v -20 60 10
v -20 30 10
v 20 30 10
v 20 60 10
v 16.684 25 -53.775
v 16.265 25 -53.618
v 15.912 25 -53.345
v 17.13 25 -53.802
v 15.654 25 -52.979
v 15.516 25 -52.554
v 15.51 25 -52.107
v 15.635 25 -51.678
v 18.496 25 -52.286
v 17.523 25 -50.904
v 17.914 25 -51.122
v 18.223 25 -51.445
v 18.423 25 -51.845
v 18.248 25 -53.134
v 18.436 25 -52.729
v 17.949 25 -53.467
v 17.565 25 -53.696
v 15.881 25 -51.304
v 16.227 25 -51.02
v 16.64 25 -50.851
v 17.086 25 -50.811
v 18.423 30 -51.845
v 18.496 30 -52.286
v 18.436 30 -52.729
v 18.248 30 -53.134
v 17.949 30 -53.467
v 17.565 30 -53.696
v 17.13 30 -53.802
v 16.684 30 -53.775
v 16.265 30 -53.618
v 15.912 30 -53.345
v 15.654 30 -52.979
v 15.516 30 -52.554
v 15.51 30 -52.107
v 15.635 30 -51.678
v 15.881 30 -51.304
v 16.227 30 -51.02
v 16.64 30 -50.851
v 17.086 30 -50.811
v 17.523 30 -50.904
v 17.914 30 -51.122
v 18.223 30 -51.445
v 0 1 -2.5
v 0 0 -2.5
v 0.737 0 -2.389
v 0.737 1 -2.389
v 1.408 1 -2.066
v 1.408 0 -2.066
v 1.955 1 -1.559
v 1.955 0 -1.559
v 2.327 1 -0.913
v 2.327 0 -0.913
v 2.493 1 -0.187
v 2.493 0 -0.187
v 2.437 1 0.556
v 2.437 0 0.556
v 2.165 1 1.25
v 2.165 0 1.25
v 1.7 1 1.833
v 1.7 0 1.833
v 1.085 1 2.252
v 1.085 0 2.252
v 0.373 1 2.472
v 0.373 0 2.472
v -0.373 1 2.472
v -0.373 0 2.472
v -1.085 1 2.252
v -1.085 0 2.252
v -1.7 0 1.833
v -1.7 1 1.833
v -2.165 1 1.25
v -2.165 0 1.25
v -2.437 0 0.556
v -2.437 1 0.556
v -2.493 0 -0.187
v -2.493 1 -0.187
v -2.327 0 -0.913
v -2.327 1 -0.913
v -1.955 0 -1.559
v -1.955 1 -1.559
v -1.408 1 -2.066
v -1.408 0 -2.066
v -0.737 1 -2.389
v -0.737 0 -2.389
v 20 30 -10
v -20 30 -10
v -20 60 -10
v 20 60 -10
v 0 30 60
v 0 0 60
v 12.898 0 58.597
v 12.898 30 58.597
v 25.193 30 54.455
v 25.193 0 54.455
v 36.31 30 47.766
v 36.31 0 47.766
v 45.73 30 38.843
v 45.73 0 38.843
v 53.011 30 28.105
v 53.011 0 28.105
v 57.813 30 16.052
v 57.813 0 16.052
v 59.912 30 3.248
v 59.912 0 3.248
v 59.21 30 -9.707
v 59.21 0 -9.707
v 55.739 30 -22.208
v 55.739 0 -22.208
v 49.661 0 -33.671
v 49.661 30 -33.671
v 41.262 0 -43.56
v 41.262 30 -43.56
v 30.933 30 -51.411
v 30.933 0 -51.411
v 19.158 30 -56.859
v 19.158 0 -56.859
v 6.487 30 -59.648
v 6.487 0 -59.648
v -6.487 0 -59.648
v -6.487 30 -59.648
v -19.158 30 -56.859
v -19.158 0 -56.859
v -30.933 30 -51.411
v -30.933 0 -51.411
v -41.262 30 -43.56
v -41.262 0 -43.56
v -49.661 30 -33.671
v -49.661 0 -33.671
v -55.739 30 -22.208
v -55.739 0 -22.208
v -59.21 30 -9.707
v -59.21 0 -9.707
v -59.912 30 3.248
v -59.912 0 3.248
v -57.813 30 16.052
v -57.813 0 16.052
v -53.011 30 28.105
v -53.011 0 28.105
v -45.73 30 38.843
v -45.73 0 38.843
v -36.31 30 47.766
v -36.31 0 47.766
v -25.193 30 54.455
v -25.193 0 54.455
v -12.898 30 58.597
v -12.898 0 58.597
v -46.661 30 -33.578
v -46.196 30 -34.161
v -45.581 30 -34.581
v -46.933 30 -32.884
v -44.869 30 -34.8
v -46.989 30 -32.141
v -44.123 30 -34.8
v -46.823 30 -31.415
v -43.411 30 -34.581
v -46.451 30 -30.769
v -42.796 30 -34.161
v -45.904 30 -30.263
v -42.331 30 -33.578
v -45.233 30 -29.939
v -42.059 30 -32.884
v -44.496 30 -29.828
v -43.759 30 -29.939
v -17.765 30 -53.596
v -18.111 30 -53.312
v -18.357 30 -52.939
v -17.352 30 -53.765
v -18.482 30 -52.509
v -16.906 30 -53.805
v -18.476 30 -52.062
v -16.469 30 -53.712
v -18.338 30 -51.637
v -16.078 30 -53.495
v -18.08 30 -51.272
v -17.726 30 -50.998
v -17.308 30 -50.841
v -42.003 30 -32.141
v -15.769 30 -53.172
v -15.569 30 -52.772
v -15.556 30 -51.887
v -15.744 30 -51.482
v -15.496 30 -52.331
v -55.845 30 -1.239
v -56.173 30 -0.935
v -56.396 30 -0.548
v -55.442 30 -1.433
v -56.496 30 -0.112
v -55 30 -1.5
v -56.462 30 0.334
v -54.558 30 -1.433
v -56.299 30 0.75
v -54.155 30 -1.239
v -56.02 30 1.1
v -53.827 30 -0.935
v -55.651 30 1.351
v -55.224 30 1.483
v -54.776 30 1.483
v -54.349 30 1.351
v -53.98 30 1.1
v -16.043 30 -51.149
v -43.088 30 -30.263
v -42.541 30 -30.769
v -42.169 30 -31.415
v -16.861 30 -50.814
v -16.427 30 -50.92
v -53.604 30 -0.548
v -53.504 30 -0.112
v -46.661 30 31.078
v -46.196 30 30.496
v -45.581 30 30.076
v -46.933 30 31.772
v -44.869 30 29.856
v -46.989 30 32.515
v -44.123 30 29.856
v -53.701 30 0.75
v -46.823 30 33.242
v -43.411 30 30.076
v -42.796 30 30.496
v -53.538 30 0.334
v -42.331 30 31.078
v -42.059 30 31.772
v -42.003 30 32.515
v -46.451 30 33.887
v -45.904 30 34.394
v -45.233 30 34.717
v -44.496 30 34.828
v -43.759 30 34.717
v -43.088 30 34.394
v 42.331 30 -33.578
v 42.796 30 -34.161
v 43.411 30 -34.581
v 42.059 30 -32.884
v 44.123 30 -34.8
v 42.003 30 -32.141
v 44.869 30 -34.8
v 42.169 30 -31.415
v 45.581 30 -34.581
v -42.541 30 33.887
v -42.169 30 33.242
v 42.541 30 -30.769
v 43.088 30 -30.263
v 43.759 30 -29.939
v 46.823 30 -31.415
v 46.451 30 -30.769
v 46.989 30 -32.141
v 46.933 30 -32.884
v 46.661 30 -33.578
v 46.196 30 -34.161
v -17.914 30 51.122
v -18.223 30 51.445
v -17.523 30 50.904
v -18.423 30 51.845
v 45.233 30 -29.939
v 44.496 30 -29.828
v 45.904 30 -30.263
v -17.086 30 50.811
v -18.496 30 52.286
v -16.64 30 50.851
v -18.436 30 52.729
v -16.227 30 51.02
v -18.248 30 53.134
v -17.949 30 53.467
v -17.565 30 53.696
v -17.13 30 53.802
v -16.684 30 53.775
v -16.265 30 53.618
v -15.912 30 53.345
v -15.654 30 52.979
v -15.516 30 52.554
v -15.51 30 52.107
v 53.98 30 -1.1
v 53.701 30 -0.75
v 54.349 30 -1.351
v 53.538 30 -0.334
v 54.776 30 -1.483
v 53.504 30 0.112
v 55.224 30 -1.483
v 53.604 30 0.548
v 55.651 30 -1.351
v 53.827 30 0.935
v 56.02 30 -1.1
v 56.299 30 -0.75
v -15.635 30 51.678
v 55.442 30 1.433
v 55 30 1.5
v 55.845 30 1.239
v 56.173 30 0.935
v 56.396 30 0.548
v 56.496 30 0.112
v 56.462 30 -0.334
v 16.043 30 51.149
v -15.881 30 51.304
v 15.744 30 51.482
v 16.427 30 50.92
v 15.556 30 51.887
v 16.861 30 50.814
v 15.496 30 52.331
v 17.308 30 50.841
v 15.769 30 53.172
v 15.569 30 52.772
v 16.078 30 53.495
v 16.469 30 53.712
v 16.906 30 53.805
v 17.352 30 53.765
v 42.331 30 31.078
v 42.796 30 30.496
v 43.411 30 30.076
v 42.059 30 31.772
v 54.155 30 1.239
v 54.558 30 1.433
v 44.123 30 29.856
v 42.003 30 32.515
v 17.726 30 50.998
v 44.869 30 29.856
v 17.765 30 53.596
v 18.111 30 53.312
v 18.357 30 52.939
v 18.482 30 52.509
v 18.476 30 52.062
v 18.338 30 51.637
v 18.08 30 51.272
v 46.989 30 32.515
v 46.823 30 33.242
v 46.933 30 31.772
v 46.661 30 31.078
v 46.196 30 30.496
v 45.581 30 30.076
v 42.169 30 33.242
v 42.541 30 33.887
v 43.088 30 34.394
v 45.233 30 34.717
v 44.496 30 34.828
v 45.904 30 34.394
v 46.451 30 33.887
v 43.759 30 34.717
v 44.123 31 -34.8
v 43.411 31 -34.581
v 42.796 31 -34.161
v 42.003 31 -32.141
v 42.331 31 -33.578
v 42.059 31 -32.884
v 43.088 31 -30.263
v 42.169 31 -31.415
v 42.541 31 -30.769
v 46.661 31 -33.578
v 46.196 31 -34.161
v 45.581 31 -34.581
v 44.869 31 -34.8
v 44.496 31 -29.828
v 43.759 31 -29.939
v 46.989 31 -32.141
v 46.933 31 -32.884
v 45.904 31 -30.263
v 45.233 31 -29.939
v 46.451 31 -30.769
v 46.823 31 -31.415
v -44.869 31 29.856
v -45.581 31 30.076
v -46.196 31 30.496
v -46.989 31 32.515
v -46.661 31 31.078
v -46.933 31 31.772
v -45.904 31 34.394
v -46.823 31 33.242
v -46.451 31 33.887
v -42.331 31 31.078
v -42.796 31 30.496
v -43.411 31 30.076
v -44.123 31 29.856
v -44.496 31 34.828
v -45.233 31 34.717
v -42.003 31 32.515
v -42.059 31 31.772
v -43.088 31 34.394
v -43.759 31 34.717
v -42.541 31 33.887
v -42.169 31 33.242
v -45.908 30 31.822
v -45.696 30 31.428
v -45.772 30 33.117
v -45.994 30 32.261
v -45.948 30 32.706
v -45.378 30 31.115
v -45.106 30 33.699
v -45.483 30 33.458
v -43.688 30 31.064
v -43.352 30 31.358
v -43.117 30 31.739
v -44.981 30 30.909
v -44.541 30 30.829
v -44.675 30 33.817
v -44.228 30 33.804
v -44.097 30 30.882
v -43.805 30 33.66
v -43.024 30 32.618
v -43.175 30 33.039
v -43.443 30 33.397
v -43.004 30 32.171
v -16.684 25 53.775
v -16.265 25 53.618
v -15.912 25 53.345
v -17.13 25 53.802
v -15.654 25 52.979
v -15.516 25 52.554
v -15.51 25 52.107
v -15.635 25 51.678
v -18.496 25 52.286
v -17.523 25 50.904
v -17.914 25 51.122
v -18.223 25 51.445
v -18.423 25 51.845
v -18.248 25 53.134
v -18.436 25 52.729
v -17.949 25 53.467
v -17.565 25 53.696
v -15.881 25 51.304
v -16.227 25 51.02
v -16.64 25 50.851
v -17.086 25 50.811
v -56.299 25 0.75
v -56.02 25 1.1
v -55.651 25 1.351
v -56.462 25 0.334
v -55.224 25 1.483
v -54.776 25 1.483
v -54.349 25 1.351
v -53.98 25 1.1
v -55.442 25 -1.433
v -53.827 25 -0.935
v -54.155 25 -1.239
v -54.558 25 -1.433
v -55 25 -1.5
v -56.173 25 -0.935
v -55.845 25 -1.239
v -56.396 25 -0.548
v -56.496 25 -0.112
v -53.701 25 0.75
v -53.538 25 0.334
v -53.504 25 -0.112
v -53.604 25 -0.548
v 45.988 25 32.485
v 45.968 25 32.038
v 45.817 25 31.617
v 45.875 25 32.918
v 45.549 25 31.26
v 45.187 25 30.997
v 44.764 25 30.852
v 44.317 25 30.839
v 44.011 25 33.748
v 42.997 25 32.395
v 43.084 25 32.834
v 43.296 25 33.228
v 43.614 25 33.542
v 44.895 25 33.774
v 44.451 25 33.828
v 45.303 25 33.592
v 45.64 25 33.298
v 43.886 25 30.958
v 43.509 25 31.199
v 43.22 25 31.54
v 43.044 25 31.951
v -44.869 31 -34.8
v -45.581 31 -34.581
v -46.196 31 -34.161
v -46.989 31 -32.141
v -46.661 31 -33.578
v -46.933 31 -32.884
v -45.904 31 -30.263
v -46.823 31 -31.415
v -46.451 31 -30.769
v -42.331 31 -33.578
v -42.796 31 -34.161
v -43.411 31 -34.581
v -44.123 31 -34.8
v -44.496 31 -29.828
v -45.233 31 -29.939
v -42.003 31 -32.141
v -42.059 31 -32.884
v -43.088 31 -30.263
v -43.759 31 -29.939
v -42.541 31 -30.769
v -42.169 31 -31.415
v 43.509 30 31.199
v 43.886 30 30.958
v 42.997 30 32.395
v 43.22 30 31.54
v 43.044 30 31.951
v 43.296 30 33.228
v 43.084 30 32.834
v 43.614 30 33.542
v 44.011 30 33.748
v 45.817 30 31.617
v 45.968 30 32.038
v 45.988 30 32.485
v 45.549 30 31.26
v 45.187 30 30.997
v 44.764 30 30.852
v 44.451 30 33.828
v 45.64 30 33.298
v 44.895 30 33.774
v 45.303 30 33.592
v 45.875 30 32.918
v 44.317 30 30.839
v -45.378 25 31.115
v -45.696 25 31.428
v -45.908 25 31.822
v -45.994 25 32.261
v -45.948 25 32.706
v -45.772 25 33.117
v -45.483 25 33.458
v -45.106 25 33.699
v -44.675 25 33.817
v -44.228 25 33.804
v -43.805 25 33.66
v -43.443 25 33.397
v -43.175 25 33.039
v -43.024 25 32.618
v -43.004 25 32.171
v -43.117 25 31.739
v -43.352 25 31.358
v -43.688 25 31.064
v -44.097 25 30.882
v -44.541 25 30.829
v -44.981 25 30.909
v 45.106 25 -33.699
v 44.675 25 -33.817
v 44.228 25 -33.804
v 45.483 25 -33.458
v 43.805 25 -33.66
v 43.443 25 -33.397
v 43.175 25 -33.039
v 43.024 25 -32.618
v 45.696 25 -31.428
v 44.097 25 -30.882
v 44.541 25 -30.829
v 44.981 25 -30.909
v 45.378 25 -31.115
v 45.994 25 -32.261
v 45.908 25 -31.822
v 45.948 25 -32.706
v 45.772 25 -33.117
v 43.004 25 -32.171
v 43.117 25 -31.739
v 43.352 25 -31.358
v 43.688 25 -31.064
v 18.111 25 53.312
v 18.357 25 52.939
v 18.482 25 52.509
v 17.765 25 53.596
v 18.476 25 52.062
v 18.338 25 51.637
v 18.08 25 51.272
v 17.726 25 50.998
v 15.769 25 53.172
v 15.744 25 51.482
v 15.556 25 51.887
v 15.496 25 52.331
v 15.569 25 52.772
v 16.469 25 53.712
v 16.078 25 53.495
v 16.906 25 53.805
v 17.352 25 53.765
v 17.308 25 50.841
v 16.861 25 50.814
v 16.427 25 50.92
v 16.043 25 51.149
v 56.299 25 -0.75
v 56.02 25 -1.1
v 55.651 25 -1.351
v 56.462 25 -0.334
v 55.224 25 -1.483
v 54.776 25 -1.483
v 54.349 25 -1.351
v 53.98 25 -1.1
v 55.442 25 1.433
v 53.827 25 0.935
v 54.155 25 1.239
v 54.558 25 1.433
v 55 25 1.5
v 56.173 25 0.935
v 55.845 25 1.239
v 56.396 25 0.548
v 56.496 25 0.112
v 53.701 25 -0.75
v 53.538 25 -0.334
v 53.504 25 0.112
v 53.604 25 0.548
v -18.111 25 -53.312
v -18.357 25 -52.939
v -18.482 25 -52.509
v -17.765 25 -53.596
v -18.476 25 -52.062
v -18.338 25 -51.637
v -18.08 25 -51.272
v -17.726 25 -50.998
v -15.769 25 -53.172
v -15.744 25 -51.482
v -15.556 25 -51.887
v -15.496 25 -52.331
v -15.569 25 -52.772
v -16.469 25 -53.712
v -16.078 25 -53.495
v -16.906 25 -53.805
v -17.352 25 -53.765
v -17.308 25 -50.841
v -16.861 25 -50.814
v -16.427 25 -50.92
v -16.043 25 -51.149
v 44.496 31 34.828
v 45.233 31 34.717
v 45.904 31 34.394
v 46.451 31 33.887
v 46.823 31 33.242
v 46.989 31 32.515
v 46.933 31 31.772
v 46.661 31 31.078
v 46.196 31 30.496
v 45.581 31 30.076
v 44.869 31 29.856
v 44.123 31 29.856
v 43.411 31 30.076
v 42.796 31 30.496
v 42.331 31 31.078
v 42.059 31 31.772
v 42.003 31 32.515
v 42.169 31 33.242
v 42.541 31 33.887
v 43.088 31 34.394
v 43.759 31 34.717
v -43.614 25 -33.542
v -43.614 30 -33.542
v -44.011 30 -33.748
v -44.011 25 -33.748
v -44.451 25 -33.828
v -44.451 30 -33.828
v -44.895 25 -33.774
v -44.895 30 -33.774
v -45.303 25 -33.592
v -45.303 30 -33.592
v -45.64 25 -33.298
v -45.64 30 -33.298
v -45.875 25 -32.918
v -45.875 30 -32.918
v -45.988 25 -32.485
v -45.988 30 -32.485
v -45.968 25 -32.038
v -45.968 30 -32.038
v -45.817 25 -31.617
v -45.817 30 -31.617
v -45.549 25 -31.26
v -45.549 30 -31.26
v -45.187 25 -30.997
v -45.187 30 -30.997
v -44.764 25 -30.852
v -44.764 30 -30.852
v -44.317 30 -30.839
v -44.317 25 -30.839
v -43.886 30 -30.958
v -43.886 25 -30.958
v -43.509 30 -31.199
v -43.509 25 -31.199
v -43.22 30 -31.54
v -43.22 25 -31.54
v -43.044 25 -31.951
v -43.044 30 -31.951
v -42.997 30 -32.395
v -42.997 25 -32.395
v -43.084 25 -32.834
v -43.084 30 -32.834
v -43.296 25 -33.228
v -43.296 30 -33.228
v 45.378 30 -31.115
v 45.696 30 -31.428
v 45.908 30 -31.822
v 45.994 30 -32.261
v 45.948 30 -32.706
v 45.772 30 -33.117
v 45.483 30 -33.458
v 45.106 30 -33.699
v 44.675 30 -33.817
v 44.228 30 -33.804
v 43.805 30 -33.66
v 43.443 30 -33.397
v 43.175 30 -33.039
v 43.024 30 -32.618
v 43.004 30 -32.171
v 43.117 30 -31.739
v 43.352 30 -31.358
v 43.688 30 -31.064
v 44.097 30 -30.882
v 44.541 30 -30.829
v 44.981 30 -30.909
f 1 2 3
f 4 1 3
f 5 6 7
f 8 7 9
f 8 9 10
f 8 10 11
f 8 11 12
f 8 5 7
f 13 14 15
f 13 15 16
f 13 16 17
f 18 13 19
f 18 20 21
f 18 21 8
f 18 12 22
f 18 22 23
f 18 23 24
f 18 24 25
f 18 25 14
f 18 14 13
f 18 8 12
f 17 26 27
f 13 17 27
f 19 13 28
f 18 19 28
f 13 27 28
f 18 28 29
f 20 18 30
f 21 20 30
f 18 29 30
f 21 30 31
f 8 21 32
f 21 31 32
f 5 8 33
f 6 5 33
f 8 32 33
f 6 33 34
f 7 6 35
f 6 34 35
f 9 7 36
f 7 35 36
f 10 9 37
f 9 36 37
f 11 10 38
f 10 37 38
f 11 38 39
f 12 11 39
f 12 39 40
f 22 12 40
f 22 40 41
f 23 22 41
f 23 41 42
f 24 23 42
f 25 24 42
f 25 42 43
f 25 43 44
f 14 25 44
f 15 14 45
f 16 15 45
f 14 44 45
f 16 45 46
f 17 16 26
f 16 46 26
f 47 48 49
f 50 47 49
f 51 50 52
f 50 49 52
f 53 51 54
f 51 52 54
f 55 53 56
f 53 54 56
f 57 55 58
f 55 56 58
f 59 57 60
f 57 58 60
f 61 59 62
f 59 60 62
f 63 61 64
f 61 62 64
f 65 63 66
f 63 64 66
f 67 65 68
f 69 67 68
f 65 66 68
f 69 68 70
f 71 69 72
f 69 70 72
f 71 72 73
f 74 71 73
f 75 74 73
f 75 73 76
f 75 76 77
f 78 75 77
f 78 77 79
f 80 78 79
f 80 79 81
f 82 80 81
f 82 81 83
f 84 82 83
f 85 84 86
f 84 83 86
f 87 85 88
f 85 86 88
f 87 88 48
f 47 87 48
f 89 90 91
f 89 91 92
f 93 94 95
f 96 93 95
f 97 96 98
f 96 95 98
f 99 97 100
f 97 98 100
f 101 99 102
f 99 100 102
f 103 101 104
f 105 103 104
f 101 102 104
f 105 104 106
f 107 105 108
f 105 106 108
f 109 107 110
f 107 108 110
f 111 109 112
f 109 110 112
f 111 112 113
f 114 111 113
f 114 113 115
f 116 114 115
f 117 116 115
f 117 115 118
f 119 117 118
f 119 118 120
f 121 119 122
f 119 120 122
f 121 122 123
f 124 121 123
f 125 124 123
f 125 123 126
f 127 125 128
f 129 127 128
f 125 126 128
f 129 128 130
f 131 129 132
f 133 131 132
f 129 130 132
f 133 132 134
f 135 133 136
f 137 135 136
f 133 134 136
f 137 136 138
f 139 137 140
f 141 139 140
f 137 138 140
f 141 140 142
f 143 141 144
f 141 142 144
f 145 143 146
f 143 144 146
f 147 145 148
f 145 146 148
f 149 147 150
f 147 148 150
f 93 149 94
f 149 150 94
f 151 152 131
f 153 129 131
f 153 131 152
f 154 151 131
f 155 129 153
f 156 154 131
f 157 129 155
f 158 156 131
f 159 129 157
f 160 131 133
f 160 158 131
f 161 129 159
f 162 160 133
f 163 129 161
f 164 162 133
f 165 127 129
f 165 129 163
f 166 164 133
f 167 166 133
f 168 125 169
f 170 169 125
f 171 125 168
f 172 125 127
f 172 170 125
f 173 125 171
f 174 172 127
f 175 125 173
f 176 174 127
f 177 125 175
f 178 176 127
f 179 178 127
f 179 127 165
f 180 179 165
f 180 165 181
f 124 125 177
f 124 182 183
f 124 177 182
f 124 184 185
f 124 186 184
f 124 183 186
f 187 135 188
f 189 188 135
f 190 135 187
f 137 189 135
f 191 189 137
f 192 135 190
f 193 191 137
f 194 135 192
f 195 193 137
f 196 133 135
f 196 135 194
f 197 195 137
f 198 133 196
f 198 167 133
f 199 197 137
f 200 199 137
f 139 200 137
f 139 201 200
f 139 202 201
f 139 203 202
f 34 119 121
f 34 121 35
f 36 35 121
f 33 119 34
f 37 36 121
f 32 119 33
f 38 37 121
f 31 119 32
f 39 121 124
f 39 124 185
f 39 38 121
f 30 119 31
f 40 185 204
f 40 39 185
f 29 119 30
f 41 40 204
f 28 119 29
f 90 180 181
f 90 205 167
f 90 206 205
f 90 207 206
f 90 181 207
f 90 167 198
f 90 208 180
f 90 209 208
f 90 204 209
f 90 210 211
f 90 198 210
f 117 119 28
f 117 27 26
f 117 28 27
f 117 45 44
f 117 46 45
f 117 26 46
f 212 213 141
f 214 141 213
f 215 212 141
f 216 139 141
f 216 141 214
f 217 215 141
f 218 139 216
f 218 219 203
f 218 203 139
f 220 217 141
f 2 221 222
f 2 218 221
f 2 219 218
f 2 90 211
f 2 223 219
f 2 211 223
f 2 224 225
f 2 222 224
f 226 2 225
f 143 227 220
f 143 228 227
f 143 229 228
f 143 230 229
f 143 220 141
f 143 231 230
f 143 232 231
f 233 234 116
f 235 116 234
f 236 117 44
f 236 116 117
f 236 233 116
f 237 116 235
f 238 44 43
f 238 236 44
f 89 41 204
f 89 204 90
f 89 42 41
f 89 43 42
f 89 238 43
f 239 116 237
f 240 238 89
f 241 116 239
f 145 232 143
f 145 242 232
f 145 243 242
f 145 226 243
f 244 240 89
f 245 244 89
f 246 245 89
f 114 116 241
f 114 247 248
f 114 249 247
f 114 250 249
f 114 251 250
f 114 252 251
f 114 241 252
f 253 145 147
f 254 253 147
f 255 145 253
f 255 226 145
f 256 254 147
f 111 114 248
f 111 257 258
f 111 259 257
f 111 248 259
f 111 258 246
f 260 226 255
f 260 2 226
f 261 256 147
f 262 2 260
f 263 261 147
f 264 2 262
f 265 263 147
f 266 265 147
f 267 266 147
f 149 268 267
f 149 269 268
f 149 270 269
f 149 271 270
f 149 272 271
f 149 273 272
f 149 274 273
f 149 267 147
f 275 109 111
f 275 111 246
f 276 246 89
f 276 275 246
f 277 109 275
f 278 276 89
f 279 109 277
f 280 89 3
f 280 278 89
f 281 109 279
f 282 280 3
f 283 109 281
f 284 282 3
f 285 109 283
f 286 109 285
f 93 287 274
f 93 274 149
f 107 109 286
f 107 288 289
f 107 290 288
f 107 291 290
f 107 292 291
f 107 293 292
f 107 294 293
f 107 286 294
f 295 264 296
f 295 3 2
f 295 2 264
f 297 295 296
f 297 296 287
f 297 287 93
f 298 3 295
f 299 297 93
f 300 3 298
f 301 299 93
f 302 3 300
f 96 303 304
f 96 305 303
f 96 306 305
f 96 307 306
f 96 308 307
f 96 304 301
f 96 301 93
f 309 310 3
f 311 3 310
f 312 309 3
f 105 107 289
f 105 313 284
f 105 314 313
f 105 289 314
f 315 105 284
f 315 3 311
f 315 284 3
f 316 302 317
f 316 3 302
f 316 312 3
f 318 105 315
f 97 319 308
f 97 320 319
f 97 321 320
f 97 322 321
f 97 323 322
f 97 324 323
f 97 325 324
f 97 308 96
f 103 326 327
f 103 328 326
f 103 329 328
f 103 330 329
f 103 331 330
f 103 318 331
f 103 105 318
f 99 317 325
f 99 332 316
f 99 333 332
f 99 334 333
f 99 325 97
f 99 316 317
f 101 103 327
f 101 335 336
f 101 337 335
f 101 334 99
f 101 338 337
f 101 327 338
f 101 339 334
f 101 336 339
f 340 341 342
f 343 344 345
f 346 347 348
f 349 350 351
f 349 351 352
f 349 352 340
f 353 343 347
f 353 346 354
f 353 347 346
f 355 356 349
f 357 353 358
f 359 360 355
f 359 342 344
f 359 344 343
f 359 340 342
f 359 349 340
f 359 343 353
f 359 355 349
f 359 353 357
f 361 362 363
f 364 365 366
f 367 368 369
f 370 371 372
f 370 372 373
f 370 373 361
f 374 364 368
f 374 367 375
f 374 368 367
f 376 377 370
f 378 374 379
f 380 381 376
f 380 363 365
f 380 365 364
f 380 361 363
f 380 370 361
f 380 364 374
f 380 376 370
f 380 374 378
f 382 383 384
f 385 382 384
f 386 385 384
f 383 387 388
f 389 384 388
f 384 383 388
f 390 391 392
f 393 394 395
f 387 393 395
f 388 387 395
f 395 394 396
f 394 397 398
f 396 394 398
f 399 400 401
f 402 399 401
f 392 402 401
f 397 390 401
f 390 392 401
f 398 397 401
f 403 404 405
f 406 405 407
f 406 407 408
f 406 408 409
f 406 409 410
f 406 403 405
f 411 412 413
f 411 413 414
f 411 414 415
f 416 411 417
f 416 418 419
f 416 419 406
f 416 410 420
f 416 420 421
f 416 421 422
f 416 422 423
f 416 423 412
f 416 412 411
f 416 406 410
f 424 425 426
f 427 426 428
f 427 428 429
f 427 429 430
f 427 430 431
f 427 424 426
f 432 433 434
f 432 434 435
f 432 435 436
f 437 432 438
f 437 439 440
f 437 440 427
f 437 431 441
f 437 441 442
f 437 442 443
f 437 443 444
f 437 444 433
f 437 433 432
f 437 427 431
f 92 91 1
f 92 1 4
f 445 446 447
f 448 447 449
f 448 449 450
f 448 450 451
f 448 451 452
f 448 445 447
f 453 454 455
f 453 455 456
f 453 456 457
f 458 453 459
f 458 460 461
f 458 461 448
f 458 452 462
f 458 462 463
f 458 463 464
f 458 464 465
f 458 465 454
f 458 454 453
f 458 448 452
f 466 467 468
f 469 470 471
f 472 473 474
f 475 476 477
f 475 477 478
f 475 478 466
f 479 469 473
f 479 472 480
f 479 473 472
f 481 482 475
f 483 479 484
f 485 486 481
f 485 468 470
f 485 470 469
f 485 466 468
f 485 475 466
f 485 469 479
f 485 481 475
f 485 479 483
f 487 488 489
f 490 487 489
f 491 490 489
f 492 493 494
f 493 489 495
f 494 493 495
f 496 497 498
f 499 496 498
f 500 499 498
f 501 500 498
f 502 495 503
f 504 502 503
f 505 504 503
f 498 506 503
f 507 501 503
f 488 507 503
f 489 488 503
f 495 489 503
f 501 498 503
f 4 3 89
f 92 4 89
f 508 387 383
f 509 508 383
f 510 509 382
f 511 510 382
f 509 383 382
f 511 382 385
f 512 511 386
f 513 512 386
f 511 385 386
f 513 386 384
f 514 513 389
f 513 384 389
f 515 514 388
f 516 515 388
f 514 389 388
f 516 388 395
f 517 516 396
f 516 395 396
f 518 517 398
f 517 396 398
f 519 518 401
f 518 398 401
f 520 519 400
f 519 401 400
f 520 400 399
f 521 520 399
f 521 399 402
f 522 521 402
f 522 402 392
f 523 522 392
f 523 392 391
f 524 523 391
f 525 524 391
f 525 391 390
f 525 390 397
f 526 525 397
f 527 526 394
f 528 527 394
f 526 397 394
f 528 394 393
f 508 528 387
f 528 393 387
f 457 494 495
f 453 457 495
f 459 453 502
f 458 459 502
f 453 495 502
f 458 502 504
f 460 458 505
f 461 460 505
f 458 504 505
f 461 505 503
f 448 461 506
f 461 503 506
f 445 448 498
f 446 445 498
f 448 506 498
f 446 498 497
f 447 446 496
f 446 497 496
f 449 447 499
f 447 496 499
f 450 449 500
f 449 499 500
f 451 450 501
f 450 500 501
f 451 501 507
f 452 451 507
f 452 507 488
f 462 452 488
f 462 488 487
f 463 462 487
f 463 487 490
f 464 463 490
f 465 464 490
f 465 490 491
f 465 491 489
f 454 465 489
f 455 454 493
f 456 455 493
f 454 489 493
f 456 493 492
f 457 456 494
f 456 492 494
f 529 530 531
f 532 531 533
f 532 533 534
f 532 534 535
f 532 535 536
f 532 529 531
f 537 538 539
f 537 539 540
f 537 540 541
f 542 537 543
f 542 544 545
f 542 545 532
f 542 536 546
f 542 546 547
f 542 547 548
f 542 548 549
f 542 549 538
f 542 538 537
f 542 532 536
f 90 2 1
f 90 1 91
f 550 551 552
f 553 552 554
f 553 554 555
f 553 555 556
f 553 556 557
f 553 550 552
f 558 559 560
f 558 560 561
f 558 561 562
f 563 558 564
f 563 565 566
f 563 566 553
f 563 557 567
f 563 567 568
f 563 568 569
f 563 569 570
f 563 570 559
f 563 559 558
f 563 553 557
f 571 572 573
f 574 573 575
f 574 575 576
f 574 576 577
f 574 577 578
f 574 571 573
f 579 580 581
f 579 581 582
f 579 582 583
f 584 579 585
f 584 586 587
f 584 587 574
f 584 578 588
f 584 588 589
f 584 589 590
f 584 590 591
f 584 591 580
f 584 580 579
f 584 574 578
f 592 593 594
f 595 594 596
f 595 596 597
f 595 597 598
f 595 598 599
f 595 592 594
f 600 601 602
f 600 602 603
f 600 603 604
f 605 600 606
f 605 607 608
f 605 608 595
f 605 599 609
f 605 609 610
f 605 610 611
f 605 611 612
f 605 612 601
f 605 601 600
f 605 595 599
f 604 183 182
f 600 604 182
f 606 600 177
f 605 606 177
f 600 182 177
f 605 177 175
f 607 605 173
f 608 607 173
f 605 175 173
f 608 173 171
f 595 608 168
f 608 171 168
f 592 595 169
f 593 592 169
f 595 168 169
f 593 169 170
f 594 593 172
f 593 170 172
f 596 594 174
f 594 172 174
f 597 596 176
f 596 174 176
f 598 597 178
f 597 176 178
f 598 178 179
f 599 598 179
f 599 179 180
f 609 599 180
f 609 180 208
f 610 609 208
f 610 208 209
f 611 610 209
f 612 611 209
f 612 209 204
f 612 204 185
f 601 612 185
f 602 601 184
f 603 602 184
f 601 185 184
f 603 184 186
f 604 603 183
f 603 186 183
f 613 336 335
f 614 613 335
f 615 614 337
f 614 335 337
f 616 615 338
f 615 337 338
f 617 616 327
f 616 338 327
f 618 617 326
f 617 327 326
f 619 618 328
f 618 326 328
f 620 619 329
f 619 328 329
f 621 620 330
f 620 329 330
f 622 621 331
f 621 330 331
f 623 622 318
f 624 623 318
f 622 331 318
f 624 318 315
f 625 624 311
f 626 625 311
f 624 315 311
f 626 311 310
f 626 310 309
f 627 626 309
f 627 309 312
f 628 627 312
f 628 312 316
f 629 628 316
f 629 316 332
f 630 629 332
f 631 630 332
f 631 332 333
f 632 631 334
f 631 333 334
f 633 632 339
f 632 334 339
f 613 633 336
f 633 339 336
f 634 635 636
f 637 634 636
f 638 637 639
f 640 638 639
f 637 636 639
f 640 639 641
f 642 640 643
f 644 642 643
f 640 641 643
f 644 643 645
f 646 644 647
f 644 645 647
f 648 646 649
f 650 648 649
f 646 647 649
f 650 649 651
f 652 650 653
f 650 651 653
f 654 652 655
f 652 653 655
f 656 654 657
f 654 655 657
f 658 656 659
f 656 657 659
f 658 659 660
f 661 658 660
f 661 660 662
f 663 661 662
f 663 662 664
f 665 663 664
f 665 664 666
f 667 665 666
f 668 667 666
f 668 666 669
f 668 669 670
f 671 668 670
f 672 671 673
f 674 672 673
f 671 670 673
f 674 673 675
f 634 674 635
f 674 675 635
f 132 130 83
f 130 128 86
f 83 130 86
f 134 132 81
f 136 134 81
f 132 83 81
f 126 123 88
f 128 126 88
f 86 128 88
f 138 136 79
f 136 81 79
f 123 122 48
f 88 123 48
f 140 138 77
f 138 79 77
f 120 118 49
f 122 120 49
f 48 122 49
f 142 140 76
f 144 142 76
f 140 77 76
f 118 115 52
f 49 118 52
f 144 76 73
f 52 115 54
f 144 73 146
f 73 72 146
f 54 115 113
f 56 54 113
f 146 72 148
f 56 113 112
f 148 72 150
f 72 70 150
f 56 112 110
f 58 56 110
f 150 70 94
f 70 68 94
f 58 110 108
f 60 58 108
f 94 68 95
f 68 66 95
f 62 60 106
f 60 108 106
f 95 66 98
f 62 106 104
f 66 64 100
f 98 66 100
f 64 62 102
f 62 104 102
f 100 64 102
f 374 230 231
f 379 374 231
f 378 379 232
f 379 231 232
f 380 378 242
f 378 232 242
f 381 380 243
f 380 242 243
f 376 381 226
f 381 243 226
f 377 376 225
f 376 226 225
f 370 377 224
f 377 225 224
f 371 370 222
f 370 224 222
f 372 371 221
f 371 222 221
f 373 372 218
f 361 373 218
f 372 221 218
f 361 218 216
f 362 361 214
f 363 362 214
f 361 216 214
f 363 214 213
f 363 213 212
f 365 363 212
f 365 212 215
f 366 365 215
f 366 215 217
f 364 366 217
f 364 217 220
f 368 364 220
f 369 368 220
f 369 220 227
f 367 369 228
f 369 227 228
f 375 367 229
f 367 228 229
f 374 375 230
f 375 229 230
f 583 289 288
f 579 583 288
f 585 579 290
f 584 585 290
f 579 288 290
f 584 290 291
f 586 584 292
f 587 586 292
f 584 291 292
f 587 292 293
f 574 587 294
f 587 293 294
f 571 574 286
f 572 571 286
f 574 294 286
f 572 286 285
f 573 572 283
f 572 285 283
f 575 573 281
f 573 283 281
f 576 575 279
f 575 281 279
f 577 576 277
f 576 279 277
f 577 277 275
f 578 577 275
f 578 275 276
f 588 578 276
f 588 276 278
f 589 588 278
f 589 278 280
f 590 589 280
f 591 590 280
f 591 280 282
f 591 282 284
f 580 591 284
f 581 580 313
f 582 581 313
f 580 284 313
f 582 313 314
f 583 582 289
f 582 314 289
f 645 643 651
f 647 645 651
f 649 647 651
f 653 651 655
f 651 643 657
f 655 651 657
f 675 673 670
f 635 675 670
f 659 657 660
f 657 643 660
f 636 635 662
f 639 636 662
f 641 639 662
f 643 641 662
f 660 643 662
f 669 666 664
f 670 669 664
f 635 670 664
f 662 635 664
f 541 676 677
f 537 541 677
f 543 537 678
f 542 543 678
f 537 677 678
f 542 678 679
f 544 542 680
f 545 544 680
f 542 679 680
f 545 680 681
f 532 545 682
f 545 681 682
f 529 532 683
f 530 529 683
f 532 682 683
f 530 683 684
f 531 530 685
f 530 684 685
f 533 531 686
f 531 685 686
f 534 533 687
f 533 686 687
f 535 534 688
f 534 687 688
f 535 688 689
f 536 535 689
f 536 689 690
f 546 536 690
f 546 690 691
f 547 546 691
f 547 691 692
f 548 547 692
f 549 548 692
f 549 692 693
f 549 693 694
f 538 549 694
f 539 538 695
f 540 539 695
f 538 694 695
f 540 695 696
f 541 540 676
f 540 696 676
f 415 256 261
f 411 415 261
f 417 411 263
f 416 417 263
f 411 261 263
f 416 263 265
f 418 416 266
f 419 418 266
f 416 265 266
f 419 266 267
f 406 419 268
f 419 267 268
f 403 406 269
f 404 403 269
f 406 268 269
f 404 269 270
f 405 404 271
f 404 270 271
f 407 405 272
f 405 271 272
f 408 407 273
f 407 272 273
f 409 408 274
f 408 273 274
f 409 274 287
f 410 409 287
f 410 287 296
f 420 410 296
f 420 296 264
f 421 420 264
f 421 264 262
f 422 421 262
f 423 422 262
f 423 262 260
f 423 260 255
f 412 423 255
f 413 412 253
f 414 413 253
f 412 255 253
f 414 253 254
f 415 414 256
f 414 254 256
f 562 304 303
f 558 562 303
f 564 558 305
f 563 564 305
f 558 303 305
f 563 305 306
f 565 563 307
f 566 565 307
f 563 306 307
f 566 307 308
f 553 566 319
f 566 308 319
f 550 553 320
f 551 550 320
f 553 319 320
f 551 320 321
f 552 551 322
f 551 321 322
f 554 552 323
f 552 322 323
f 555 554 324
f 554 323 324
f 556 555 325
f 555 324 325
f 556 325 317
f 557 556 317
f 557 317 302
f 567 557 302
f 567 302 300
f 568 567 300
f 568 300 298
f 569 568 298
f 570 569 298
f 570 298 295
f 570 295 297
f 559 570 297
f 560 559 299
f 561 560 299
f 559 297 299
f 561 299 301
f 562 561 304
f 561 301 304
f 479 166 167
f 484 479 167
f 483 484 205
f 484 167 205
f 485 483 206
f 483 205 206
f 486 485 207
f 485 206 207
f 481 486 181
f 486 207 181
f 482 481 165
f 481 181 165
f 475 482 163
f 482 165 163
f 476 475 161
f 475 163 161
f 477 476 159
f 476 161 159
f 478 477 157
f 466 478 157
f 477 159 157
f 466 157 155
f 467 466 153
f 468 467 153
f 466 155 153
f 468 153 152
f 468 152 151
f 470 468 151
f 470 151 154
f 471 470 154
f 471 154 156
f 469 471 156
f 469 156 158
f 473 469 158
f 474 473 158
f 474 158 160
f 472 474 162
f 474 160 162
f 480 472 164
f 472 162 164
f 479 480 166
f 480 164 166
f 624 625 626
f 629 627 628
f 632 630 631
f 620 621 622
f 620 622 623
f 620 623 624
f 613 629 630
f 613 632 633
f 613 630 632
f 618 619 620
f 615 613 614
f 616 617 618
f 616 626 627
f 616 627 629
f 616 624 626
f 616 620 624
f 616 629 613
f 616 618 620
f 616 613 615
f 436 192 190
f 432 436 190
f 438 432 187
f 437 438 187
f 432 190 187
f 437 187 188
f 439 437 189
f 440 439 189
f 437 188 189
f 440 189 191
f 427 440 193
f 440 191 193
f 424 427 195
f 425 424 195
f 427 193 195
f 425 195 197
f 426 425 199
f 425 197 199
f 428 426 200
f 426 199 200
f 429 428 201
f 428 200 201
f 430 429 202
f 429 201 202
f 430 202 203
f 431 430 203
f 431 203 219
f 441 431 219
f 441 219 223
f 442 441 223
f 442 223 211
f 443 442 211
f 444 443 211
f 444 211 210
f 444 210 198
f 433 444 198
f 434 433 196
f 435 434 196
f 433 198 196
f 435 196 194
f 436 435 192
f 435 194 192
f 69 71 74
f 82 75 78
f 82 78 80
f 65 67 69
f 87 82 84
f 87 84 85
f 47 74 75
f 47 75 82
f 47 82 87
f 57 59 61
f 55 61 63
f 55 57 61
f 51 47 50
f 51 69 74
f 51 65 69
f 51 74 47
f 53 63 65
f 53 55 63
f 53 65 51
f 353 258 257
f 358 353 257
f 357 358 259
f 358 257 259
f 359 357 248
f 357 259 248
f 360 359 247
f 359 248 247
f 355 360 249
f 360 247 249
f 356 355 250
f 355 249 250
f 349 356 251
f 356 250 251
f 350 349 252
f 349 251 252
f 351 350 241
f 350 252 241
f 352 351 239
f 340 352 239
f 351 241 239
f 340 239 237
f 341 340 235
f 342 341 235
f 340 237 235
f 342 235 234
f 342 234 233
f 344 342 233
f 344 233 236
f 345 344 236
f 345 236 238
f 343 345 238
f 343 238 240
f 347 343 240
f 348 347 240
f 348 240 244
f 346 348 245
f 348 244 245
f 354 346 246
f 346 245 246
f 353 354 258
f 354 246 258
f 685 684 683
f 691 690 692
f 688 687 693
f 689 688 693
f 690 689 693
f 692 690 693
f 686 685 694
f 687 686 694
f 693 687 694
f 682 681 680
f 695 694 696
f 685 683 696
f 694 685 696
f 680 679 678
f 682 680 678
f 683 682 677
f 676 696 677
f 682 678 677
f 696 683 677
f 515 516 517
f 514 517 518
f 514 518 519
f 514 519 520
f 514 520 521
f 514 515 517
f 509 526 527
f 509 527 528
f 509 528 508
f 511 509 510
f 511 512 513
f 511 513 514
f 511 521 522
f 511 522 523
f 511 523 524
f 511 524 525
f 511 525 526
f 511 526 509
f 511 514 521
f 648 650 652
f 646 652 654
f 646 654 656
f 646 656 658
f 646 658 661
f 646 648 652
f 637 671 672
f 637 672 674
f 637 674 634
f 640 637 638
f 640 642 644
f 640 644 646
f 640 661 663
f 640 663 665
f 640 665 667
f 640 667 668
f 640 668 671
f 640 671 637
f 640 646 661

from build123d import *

# Parameters (mm, degrees)
SKETCH_1_R               = 60
EXTRUDE_1_DEPTH          = 30
SKETCH_2_R               = 1.5
CUT_EXTRUDE_1_DEPTH      = 5
PATTERN_CIRCULAR_1_COUNT = 10
SKETCH_3_W               = 40
SKETCH_3_H               = 20
EXTRUDE_2_DEPTH          = 30
SKETCH_5_R               = 2.5
EXTRUDE_4_DEPTH          = 1
SKETCH_7_R               = 2.5
CUT_EXTRUDE_2_DEPTH      = 1


with BuildPart() as part:
    # 草图1 → 凸台-拉伸1 (new body)
    with BuildSketch(Plane(origin=(0, 0, 0), x_dir=(1, 0, 0), z_dir=(0, 1, 0))):
        with Locations(Location((0, 0, 0), (0, 0, 270))):
            Circle(SKETCH_1_R)
    extrude(amount=EXTRUDE_1_DEPTH)

    # 草图2 → 切除-拉伸1 (cut)
    with BuildSketch(Plane(origin=(0, 30, 0), x_dir=(1, 0, 0), z_dir=(0, 1, 0))):
        with Locations(Location((55, 0, 0), (0, 0, 270))):
            Circle(SKETCH_2_R)
    cut_extrude_1 = extrude(amount=-CUT_EXTRUDE_1_DEPTH, mode=Mode.SUBTRACT)

    # 阵列(圆周)1: 切除-拉伸1 ×10 about axis
    pattern_circular_1_axis = Axis((0, 0, 0), (0, 1, 0))
    for i in range(1, PATTERN_CIRCULAR_1_COUNT):
        add(cut_extrude_1.rotate(pattern_circular_1_axis, i * 360 / PATTERN_CIRCULAR_1_COUNT), mode=Mode.SUBTRACT)

    # 草图3 → 凸台-拉伸2 (add)
    with BuildSketch(Plane(origin=(0, 30, 0), x_dir=(1, 0, 0), z_dir=(0, 1, 0))):
        Rectangle(SKETCH_3_W, SKETCH_3_H)
    extrude(amount=EXTRUDE_2_DEPTH)

    # 草图5 → 凸台-拉伸4 (add)
    with BuildSketch(Plane(origin=(0, 30, 0), x_dir=(1, 0, 0), z_dir=(0, 1, 0))):
        with Locations(Location((-44.495934691, 32.328188876, 0), (0, 0, 270))):
            Circle(SKETCH_5_R)
        with Locations(Location((44.495934691, -32.328188876, 0), (0, 0, 270))):
            Circle(SKETCH_5_R)
        with Locations(Location((44.495934691, 32.328188876, 0), (0, 0, 270))):
            Circle(SKETCH_5_R)
        with Locations(Location((-44.495934691, -32.328188876, 0), (0, 0, 270))):
            Circle(SKETCH_5_R)
    extrude(amount=EXTRUDE_4_DEPTH)

    # 草图7 → 切除-拉伸2 (cut)
    with BuildSketch(Plane.XZ):
        with Locations(Location((0, 0, 0), (0, 0, 270))):
            Circle(SKETCH_7_R)
    extrude(amount=-CUT_EXTRUDE_2_DEPTH, mode=Mode.SUBTRACT)


solid = part.part
